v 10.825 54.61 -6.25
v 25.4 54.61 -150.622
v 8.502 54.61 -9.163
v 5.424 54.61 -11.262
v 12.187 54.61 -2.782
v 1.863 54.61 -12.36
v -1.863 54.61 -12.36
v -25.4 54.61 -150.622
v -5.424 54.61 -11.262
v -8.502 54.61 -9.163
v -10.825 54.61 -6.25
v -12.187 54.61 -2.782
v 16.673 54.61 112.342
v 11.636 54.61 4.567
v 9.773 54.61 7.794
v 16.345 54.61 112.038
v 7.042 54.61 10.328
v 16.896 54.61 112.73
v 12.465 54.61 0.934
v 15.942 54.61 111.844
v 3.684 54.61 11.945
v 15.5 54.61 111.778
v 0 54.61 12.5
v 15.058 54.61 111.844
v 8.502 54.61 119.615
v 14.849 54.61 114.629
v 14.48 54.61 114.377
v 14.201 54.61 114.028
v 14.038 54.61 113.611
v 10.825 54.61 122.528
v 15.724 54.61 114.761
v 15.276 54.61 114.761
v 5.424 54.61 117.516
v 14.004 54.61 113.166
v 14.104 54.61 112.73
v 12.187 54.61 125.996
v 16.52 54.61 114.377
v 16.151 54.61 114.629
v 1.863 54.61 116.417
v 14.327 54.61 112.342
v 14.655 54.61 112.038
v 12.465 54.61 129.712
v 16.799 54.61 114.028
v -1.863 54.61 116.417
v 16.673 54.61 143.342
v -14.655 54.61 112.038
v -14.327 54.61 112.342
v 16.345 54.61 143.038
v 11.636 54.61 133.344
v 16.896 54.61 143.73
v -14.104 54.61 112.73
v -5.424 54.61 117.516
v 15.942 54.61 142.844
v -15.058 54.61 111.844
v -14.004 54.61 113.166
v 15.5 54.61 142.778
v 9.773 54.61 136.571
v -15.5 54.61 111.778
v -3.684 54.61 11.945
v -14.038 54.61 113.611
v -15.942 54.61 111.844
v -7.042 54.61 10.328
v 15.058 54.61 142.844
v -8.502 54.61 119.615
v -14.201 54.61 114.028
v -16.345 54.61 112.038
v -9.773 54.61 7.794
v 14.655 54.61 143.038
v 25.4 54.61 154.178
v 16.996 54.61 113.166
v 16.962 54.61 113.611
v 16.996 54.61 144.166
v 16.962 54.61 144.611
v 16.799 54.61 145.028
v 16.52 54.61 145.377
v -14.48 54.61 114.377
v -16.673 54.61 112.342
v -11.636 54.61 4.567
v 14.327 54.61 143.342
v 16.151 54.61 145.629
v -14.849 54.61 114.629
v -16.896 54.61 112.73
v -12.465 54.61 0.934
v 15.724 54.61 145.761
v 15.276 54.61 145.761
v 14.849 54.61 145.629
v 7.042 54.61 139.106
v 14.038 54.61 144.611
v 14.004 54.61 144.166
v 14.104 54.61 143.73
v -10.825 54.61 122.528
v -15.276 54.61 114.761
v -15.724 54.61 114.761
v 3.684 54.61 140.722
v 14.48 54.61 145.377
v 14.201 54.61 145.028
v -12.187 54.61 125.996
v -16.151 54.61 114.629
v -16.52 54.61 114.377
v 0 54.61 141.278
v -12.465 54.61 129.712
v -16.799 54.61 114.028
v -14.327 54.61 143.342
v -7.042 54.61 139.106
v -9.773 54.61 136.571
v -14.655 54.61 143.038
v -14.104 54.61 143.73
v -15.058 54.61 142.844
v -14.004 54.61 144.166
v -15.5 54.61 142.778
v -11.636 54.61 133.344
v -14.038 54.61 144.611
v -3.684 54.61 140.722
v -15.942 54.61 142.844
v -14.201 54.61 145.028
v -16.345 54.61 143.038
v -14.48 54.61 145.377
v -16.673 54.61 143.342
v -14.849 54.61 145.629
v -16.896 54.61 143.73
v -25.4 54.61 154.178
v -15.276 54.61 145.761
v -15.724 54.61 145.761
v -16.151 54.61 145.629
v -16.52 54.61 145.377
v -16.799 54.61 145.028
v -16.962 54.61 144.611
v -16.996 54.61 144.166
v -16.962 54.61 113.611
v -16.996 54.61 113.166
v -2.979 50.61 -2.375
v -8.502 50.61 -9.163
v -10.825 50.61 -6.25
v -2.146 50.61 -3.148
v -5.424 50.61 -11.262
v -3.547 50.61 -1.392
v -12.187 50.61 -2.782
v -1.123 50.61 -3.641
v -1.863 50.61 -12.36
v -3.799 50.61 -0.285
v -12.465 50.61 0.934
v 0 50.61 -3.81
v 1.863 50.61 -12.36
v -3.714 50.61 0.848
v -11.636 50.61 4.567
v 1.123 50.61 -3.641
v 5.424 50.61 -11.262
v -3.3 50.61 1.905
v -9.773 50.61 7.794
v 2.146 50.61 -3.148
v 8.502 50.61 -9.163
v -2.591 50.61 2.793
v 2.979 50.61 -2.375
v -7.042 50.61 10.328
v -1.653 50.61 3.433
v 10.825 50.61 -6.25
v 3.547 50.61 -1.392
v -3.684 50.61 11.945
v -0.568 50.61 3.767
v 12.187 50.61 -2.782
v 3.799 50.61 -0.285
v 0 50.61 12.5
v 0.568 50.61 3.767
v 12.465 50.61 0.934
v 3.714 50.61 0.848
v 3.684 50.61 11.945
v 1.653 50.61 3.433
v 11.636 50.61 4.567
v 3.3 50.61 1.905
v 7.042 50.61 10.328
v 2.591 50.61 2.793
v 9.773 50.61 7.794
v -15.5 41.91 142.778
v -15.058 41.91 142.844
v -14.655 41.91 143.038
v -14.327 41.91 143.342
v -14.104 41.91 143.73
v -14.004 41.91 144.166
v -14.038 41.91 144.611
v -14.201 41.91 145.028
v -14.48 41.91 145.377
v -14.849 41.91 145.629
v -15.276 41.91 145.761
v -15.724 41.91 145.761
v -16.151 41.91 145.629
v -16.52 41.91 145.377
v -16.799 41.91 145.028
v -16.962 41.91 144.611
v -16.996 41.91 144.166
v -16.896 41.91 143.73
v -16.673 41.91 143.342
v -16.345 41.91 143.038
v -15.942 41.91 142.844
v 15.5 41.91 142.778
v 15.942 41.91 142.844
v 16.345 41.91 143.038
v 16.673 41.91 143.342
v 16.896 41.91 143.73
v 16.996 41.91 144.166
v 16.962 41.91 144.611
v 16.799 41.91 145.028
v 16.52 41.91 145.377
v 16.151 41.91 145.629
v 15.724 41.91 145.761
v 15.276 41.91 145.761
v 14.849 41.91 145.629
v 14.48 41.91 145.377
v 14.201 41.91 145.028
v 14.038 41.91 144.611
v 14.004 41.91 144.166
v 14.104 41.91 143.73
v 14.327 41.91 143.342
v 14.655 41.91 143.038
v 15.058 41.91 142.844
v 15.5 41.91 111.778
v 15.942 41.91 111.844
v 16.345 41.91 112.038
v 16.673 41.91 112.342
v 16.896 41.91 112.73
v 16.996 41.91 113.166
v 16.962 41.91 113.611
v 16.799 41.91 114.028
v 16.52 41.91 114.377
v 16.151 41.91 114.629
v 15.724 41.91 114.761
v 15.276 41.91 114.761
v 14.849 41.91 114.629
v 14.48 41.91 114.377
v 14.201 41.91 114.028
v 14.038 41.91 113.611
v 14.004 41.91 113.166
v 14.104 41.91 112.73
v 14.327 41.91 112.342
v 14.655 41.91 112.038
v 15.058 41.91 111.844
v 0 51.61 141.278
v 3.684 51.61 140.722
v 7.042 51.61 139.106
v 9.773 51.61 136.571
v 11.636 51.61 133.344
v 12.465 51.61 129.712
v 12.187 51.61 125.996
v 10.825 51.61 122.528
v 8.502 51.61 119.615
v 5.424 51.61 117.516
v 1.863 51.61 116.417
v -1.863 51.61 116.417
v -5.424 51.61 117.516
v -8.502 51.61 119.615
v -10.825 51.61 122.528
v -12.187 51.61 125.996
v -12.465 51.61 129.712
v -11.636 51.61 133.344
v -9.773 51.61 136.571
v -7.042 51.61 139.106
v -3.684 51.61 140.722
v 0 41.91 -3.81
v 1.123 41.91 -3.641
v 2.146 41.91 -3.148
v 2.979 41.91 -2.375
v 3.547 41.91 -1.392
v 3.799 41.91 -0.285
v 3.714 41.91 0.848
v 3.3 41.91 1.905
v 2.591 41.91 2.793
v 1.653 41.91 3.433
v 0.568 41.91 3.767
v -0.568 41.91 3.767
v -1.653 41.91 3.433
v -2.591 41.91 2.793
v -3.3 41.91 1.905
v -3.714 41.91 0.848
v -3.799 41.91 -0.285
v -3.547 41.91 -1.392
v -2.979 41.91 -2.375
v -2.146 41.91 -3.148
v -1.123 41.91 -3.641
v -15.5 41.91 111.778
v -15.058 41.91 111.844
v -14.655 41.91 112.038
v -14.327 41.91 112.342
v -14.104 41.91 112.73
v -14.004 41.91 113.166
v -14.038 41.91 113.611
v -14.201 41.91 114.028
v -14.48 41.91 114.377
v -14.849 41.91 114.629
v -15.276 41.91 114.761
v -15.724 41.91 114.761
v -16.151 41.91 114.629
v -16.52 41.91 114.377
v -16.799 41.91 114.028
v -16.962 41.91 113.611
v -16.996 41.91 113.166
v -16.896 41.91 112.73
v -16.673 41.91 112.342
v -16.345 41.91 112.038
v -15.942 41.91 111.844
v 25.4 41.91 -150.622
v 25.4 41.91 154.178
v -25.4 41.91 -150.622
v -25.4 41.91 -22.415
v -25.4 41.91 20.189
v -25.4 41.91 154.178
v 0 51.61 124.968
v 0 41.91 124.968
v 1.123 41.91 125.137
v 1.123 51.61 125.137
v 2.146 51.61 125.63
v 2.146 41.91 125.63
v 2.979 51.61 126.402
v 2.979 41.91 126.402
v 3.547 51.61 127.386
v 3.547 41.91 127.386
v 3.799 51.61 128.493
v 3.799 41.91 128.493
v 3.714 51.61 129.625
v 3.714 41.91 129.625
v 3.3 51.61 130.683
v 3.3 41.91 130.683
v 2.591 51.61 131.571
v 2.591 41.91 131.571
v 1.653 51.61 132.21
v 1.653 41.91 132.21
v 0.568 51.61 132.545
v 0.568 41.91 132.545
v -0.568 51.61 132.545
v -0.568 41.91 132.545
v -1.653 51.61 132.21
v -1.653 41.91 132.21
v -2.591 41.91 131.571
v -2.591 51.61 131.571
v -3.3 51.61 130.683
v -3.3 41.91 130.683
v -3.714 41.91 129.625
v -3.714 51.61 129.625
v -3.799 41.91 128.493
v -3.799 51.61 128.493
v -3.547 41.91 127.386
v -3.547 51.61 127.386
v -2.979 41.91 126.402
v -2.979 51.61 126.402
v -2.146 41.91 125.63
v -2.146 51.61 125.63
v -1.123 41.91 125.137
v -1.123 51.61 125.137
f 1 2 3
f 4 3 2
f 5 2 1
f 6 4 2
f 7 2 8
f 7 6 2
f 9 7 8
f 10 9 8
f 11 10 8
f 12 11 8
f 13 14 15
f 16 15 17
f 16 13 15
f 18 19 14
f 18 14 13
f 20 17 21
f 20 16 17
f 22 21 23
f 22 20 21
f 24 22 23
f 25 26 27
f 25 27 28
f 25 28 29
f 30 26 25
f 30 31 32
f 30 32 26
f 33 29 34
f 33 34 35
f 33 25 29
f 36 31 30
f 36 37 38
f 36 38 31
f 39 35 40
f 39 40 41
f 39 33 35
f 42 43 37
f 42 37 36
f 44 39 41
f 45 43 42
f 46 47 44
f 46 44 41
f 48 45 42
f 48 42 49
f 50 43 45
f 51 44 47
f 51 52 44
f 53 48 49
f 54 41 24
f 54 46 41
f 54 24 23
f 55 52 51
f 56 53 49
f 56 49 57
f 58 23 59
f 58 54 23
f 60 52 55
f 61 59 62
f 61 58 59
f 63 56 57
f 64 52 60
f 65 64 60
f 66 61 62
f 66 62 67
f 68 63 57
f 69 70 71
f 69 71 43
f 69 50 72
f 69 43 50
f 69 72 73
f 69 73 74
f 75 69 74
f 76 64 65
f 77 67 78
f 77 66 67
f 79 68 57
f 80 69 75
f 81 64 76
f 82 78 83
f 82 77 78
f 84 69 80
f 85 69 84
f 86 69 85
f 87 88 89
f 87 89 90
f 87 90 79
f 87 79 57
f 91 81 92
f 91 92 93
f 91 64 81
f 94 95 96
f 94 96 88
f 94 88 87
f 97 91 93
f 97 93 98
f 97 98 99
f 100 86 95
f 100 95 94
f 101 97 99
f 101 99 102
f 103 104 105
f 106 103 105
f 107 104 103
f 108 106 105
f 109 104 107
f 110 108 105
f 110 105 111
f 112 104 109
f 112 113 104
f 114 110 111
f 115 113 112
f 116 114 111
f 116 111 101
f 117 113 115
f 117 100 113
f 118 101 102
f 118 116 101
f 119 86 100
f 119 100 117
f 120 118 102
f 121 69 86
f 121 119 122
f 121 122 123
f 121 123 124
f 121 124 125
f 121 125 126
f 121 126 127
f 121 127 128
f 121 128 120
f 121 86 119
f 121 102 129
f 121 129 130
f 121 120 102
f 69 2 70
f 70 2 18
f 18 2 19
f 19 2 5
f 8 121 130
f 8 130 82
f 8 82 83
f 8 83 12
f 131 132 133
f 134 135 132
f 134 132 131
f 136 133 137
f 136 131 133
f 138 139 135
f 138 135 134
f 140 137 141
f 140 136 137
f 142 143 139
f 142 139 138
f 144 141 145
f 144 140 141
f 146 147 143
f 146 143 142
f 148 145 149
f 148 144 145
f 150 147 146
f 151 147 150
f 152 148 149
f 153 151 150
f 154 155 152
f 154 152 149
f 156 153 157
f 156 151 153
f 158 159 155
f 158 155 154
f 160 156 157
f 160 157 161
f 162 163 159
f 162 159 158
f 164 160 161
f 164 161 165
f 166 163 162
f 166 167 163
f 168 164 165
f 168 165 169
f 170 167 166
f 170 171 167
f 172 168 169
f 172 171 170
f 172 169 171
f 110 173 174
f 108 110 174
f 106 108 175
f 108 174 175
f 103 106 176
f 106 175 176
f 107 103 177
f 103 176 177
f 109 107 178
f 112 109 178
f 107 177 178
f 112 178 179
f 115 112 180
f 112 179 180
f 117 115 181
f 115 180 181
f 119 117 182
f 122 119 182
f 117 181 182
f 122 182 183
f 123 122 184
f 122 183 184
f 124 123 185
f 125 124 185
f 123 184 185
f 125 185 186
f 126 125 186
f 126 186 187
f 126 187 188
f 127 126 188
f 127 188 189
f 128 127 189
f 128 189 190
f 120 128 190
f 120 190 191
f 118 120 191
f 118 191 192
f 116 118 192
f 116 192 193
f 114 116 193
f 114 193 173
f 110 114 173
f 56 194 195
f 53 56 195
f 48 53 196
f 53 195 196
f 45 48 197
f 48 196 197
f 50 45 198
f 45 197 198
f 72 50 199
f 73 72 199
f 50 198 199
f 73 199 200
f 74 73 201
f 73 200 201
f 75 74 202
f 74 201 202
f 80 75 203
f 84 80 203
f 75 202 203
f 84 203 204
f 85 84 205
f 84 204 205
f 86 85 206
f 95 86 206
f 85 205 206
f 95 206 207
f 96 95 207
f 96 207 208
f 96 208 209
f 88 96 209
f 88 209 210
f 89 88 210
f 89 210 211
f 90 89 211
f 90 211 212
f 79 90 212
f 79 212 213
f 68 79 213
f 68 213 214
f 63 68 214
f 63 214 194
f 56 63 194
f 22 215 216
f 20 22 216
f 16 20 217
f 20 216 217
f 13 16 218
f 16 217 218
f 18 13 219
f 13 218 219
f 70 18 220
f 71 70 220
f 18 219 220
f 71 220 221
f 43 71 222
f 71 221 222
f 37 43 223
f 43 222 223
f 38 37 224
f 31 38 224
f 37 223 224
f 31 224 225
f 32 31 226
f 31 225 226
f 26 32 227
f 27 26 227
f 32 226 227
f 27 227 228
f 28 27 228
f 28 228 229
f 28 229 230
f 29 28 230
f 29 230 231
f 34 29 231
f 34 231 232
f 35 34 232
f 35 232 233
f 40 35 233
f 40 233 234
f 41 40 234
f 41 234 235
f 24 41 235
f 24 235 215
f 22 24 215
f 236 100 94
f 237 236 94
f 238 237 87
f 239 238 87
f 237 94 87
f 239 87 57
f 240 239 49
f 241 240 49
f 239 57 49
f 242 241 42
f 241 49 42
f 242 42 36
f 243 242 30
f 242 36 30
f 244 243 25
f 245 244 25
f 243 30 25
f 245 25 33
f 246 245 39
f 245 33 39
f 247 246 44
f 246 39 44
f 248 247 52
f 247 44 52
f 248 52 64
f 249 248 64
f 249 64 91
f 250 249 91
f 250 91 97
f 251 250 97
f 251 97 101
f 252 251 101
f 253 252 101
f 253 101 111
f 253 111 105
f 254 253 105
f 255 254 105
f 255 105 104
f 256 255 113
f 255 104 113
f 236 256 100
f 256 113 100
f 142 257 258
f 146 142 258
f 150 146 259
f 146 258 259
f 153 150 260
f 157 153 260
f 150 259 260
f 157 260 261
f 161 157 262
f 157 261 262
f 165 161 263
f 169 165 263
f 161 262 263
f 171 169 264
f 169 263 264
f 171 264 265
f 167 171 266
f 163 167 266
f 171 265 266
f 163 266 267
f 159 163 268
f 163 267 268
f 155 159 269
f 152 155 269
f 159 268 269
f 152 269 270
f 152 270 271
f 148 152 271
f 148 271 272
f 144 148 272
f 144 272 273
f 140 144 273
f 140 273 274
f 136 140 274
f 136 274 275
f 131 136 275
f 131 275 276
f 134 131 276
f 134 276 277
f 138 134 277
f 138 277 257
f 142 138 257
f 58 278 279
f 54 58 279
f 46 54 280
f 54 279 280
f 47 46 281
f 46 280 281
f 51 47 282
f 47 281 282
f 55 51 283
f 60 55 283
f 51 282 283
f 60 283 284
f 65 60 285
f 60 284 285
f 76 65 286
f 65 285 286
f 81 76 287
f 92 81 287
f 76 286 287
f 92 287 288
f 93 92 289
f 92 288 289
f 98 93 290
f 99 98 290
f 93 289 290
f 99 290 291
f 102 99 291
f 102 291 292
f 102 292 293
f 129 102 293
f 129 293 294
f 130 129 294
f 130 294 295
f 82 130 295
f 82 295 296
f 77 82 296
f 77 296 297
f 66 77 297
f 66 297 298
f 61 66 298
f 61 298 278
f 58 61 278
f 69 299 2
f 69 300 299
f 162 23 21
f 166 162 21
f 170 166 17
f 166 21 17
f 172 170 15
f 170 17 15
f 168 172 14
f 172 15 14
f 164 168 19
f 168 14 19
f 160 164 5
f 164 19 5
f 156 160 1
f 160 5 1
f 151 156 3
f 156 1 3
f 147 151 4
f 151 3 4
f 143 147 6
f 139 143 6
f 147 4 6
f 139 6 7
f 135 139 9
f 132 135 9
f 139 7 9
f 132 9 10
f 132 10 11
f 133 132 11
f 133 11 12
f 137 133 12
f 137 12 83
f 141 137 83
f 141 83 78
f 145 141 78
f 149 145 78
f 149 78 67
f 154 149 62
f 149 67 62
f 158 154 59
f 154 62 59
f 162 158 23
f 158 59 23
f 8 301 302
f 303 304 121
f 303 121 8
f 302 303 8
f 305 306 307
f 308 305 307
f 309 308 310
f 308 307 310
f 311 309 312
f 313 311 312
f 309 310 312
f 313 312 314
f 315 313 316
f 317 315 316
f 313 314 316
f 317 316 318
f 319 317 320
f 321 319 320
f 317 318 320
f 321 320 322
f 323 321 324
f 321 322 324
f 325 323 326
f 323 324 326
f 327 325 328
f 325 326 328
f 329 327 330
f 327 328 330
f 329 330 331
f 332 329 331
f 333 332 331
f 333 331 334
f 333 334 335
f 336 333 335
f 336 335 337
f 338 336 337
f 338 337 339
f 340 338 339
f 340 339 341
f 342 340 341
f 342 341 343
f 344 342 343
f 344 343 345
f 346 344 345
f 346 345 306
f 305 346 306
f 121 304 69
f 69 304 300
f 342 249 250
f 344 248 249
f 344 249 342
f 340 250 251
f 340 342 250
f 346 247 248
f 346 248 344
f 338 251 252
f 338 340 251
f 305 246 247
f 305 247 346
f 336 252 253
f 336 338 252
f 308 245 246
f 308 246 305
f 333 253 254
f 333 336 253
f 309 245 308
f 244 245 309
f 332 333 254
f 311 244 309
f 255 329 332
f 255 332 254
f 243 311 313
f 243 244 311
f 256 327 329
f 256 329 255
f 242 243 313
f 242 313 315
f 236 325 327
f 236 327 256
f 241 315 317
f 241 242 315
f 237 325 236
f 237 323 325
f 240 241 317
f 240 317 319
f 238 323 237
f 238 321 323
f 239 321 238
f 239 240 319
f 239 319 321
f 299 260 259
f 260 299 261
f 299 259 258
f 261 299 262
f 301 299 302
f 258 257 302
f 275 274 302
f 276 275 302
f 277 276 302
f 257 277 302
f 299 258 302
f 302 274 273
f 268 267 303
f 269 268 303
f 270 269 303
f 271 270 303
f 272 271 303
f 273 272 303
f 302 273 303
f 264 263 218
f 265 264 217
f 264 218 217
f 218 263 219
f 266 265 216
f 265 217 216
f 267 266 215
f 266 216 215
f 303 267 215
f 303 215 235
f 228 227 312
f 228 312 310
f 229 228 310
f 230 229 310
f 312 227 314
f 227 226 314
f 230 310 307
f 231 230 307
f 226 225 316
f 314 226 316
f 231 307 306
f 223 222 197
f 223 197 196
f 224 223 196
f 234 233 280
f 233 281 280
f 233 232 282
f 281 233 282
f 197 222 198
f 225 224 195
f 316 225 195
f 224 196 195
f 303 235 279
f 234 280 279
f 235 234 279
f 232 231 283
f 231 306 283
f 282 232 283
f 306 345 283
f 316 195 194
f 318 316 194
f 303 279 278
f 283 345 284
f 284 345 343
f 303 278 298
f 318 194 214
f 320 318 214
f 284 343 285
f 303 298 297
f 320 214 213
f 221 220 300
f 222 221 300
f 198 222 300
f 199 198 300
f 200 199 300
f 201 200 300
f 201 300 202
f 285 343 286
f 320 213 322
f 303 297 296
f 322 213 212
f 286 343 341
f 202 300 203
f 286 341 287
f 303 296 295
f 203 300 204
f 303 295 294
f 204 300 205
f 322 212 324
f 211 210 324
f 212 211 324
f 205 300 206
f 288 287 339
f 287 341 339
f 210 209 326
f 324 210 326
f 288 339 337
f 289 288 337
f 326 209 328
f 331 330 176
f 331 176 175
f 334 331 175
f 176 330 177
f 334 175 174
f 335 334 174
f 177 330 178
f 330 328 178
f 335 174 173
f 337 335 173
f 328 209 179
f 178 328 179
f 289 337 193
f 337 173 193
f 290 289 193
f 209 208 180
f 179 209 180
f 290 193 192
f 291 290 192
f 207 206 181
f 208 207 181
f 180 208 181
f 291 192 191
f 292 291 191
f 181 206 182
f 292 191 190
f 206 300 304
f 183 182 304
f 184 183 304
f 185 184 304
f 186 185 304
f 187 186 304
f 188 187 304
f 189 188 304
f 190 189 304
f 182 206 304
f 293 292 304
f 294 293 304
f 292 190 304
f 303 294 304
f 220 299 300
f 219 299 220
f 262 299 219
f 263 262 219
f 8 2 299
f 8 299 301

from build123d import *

# Parameters (mm, degrees)
SKETCH2_R           = 5.08
BOSS_EXTRUDE2_DEPTH = 41.91
SKETCH8_W           = 50.8
SKETCH8_H           = 177.8
BOSS_EXTRUDE3_DEPTH = 12.7
SKETCH14_R          = 1.5
SKETCH14_R_2        = 3.81
CUT_EXTRUDE5_DEPTH  = 30.94
SKETCH18_R          = 12.5
CUT_EXTRUDE6_DEPTH  = 3
SKETCH19_W          = 42.604525883
SKETCH19_H          = 46.988260705
CUT_EXTRUDE7_DEPTH  = 85.804
SKETCH20_R          = 3.81
CUT_EXTRUDE8_DEPTH  = 157.771189784
SKETCH21_R          = 12.5
CUT_EXTRUDE9_DEPTH  = 4
SKETCH23_W          = 50.8
SKETCH23_H          = 12.7
BOSS_EXTRUDE4_DEPTH = 127


with BuildPart() as part:
    # Sketch2 → Boss-Extrude2 (new body)
    with BuildSketch(Plane(origin=(0, 0, 0), x_dir=(-1, 0, 0), z_dir=(0, 1, 0))):
        with Locations(Location((0, 0, 0), (0, 0, 90))):
            Circle(SKETCH2_R)
    extrude(amount=BOSS_EXTRUDE2_DEPTH)

    # Sketch8 → Boss-Extrude3 (add)
    with BuildSketch(Plane(origin=(0, 41.91, 0), x_dir=(1, 0, 0), z_dir=(0, 1, 0))):
        with Locations((0, -65.27767655)):
            Rectangle(SKETCH8_W, SKETCH8_H)
    extrude(amount=BOSS_EXTRUDE3_DEPTH)

    # Sketch14 → Cut-Extrude5 (cut)
    with BuildSketch(Plane.XZ.offset(-41.91)):
        with Locations(Location((15.5, 144.27767655, 0), (0, 0, 270))):
            Circle(SKETCH14_R)
        with Locations(Location((0, 128.77767655, 0), (0, 0, 270))):
            Circle(SKETCH14_R_2)
        with Locations(Location((-15.5, 113.27767655, 0), (0, 0, 270))):
            Circle(SKETCH14_R)
        with Locations(Location((15.5, 113.27767655, 0), (0, 0, 270))):
            Circle(SKETCH14_R)
        with Locations(Location((-15.5, 144.27767655, 0), (0, 0, 270))):
            Circle(SKETCH14_R)
    extrude(amount=-CUT_EXTRUDE5_DEPTH, mode=Mode.SUBTRACT)

    # Sketch18 → Cut-Extrude6 (cut)
    with BuildSketch(Plane(origin=(0, 54.61, 0), x_dir=(1, 0, 0), z_dir=(0, 1, 0))):
        with Locations(Location((0, -128.77767655, 0), (0, 0, 270))):
            Circle(SKETCH18_R)
    extrude(amount=-CUT_EXTRUDE6_DEPTH, mode=Mode.SUBTRACT)

    # Sketch19 → Cut-Extrude7 (cut)
    with BuildSketch(Plane.ZY.offset(25.4)):
        with Locations((-1.112784187, 18.415869648)):
            Rectangle(SKETCH19_W, SKETCH19_H)
    extrude(amount=-CUT_EXTRUDE7_DEPTH, mode=Mode.SUBTRACT)

    # Sketch20 → Cut-Extrude8 (cut, through all)
    with BuildSketch(Plane.XZ.offset(-41.91)):
        with Locations(Location((0, 0, 0), (0, 0, 270))):
            Circle(SKETCH20_R)
    extrude(amount=-CUT_EXTRUDE8_DEPTH, mode=Mode.SUBTRACT)

    # Sketch21 → Cut-Extrude9 (cut)
    with BuildSketch(Plane(origin=(0, 54.61, 0), x_dir=(1, 0, 0), z_dir=(0, 1, 0))):
        with Locations(Location((0, 0, 0), (0, 0, 270))):
            Circle(SKETCH21_R)
    extrude(amount=-CUT_EXTRUDE9_DEPTH, mode=Mode.SUBTRACT)

    # Sketch23 → Boss-Extrude4 (add)
    with BuildSketch(Plane(origin=(0, 0, -23.62232345), x_dir=(-1, 0, 0), z_dir=(0, 0, -1))):
        with Locations((0, 48.26)):
            Rectangle(SKETCH23_W, SKETCH23_H)
    extrude(amount=BOSS_EXTRUDE4_DEPTH)


solid = part.part
